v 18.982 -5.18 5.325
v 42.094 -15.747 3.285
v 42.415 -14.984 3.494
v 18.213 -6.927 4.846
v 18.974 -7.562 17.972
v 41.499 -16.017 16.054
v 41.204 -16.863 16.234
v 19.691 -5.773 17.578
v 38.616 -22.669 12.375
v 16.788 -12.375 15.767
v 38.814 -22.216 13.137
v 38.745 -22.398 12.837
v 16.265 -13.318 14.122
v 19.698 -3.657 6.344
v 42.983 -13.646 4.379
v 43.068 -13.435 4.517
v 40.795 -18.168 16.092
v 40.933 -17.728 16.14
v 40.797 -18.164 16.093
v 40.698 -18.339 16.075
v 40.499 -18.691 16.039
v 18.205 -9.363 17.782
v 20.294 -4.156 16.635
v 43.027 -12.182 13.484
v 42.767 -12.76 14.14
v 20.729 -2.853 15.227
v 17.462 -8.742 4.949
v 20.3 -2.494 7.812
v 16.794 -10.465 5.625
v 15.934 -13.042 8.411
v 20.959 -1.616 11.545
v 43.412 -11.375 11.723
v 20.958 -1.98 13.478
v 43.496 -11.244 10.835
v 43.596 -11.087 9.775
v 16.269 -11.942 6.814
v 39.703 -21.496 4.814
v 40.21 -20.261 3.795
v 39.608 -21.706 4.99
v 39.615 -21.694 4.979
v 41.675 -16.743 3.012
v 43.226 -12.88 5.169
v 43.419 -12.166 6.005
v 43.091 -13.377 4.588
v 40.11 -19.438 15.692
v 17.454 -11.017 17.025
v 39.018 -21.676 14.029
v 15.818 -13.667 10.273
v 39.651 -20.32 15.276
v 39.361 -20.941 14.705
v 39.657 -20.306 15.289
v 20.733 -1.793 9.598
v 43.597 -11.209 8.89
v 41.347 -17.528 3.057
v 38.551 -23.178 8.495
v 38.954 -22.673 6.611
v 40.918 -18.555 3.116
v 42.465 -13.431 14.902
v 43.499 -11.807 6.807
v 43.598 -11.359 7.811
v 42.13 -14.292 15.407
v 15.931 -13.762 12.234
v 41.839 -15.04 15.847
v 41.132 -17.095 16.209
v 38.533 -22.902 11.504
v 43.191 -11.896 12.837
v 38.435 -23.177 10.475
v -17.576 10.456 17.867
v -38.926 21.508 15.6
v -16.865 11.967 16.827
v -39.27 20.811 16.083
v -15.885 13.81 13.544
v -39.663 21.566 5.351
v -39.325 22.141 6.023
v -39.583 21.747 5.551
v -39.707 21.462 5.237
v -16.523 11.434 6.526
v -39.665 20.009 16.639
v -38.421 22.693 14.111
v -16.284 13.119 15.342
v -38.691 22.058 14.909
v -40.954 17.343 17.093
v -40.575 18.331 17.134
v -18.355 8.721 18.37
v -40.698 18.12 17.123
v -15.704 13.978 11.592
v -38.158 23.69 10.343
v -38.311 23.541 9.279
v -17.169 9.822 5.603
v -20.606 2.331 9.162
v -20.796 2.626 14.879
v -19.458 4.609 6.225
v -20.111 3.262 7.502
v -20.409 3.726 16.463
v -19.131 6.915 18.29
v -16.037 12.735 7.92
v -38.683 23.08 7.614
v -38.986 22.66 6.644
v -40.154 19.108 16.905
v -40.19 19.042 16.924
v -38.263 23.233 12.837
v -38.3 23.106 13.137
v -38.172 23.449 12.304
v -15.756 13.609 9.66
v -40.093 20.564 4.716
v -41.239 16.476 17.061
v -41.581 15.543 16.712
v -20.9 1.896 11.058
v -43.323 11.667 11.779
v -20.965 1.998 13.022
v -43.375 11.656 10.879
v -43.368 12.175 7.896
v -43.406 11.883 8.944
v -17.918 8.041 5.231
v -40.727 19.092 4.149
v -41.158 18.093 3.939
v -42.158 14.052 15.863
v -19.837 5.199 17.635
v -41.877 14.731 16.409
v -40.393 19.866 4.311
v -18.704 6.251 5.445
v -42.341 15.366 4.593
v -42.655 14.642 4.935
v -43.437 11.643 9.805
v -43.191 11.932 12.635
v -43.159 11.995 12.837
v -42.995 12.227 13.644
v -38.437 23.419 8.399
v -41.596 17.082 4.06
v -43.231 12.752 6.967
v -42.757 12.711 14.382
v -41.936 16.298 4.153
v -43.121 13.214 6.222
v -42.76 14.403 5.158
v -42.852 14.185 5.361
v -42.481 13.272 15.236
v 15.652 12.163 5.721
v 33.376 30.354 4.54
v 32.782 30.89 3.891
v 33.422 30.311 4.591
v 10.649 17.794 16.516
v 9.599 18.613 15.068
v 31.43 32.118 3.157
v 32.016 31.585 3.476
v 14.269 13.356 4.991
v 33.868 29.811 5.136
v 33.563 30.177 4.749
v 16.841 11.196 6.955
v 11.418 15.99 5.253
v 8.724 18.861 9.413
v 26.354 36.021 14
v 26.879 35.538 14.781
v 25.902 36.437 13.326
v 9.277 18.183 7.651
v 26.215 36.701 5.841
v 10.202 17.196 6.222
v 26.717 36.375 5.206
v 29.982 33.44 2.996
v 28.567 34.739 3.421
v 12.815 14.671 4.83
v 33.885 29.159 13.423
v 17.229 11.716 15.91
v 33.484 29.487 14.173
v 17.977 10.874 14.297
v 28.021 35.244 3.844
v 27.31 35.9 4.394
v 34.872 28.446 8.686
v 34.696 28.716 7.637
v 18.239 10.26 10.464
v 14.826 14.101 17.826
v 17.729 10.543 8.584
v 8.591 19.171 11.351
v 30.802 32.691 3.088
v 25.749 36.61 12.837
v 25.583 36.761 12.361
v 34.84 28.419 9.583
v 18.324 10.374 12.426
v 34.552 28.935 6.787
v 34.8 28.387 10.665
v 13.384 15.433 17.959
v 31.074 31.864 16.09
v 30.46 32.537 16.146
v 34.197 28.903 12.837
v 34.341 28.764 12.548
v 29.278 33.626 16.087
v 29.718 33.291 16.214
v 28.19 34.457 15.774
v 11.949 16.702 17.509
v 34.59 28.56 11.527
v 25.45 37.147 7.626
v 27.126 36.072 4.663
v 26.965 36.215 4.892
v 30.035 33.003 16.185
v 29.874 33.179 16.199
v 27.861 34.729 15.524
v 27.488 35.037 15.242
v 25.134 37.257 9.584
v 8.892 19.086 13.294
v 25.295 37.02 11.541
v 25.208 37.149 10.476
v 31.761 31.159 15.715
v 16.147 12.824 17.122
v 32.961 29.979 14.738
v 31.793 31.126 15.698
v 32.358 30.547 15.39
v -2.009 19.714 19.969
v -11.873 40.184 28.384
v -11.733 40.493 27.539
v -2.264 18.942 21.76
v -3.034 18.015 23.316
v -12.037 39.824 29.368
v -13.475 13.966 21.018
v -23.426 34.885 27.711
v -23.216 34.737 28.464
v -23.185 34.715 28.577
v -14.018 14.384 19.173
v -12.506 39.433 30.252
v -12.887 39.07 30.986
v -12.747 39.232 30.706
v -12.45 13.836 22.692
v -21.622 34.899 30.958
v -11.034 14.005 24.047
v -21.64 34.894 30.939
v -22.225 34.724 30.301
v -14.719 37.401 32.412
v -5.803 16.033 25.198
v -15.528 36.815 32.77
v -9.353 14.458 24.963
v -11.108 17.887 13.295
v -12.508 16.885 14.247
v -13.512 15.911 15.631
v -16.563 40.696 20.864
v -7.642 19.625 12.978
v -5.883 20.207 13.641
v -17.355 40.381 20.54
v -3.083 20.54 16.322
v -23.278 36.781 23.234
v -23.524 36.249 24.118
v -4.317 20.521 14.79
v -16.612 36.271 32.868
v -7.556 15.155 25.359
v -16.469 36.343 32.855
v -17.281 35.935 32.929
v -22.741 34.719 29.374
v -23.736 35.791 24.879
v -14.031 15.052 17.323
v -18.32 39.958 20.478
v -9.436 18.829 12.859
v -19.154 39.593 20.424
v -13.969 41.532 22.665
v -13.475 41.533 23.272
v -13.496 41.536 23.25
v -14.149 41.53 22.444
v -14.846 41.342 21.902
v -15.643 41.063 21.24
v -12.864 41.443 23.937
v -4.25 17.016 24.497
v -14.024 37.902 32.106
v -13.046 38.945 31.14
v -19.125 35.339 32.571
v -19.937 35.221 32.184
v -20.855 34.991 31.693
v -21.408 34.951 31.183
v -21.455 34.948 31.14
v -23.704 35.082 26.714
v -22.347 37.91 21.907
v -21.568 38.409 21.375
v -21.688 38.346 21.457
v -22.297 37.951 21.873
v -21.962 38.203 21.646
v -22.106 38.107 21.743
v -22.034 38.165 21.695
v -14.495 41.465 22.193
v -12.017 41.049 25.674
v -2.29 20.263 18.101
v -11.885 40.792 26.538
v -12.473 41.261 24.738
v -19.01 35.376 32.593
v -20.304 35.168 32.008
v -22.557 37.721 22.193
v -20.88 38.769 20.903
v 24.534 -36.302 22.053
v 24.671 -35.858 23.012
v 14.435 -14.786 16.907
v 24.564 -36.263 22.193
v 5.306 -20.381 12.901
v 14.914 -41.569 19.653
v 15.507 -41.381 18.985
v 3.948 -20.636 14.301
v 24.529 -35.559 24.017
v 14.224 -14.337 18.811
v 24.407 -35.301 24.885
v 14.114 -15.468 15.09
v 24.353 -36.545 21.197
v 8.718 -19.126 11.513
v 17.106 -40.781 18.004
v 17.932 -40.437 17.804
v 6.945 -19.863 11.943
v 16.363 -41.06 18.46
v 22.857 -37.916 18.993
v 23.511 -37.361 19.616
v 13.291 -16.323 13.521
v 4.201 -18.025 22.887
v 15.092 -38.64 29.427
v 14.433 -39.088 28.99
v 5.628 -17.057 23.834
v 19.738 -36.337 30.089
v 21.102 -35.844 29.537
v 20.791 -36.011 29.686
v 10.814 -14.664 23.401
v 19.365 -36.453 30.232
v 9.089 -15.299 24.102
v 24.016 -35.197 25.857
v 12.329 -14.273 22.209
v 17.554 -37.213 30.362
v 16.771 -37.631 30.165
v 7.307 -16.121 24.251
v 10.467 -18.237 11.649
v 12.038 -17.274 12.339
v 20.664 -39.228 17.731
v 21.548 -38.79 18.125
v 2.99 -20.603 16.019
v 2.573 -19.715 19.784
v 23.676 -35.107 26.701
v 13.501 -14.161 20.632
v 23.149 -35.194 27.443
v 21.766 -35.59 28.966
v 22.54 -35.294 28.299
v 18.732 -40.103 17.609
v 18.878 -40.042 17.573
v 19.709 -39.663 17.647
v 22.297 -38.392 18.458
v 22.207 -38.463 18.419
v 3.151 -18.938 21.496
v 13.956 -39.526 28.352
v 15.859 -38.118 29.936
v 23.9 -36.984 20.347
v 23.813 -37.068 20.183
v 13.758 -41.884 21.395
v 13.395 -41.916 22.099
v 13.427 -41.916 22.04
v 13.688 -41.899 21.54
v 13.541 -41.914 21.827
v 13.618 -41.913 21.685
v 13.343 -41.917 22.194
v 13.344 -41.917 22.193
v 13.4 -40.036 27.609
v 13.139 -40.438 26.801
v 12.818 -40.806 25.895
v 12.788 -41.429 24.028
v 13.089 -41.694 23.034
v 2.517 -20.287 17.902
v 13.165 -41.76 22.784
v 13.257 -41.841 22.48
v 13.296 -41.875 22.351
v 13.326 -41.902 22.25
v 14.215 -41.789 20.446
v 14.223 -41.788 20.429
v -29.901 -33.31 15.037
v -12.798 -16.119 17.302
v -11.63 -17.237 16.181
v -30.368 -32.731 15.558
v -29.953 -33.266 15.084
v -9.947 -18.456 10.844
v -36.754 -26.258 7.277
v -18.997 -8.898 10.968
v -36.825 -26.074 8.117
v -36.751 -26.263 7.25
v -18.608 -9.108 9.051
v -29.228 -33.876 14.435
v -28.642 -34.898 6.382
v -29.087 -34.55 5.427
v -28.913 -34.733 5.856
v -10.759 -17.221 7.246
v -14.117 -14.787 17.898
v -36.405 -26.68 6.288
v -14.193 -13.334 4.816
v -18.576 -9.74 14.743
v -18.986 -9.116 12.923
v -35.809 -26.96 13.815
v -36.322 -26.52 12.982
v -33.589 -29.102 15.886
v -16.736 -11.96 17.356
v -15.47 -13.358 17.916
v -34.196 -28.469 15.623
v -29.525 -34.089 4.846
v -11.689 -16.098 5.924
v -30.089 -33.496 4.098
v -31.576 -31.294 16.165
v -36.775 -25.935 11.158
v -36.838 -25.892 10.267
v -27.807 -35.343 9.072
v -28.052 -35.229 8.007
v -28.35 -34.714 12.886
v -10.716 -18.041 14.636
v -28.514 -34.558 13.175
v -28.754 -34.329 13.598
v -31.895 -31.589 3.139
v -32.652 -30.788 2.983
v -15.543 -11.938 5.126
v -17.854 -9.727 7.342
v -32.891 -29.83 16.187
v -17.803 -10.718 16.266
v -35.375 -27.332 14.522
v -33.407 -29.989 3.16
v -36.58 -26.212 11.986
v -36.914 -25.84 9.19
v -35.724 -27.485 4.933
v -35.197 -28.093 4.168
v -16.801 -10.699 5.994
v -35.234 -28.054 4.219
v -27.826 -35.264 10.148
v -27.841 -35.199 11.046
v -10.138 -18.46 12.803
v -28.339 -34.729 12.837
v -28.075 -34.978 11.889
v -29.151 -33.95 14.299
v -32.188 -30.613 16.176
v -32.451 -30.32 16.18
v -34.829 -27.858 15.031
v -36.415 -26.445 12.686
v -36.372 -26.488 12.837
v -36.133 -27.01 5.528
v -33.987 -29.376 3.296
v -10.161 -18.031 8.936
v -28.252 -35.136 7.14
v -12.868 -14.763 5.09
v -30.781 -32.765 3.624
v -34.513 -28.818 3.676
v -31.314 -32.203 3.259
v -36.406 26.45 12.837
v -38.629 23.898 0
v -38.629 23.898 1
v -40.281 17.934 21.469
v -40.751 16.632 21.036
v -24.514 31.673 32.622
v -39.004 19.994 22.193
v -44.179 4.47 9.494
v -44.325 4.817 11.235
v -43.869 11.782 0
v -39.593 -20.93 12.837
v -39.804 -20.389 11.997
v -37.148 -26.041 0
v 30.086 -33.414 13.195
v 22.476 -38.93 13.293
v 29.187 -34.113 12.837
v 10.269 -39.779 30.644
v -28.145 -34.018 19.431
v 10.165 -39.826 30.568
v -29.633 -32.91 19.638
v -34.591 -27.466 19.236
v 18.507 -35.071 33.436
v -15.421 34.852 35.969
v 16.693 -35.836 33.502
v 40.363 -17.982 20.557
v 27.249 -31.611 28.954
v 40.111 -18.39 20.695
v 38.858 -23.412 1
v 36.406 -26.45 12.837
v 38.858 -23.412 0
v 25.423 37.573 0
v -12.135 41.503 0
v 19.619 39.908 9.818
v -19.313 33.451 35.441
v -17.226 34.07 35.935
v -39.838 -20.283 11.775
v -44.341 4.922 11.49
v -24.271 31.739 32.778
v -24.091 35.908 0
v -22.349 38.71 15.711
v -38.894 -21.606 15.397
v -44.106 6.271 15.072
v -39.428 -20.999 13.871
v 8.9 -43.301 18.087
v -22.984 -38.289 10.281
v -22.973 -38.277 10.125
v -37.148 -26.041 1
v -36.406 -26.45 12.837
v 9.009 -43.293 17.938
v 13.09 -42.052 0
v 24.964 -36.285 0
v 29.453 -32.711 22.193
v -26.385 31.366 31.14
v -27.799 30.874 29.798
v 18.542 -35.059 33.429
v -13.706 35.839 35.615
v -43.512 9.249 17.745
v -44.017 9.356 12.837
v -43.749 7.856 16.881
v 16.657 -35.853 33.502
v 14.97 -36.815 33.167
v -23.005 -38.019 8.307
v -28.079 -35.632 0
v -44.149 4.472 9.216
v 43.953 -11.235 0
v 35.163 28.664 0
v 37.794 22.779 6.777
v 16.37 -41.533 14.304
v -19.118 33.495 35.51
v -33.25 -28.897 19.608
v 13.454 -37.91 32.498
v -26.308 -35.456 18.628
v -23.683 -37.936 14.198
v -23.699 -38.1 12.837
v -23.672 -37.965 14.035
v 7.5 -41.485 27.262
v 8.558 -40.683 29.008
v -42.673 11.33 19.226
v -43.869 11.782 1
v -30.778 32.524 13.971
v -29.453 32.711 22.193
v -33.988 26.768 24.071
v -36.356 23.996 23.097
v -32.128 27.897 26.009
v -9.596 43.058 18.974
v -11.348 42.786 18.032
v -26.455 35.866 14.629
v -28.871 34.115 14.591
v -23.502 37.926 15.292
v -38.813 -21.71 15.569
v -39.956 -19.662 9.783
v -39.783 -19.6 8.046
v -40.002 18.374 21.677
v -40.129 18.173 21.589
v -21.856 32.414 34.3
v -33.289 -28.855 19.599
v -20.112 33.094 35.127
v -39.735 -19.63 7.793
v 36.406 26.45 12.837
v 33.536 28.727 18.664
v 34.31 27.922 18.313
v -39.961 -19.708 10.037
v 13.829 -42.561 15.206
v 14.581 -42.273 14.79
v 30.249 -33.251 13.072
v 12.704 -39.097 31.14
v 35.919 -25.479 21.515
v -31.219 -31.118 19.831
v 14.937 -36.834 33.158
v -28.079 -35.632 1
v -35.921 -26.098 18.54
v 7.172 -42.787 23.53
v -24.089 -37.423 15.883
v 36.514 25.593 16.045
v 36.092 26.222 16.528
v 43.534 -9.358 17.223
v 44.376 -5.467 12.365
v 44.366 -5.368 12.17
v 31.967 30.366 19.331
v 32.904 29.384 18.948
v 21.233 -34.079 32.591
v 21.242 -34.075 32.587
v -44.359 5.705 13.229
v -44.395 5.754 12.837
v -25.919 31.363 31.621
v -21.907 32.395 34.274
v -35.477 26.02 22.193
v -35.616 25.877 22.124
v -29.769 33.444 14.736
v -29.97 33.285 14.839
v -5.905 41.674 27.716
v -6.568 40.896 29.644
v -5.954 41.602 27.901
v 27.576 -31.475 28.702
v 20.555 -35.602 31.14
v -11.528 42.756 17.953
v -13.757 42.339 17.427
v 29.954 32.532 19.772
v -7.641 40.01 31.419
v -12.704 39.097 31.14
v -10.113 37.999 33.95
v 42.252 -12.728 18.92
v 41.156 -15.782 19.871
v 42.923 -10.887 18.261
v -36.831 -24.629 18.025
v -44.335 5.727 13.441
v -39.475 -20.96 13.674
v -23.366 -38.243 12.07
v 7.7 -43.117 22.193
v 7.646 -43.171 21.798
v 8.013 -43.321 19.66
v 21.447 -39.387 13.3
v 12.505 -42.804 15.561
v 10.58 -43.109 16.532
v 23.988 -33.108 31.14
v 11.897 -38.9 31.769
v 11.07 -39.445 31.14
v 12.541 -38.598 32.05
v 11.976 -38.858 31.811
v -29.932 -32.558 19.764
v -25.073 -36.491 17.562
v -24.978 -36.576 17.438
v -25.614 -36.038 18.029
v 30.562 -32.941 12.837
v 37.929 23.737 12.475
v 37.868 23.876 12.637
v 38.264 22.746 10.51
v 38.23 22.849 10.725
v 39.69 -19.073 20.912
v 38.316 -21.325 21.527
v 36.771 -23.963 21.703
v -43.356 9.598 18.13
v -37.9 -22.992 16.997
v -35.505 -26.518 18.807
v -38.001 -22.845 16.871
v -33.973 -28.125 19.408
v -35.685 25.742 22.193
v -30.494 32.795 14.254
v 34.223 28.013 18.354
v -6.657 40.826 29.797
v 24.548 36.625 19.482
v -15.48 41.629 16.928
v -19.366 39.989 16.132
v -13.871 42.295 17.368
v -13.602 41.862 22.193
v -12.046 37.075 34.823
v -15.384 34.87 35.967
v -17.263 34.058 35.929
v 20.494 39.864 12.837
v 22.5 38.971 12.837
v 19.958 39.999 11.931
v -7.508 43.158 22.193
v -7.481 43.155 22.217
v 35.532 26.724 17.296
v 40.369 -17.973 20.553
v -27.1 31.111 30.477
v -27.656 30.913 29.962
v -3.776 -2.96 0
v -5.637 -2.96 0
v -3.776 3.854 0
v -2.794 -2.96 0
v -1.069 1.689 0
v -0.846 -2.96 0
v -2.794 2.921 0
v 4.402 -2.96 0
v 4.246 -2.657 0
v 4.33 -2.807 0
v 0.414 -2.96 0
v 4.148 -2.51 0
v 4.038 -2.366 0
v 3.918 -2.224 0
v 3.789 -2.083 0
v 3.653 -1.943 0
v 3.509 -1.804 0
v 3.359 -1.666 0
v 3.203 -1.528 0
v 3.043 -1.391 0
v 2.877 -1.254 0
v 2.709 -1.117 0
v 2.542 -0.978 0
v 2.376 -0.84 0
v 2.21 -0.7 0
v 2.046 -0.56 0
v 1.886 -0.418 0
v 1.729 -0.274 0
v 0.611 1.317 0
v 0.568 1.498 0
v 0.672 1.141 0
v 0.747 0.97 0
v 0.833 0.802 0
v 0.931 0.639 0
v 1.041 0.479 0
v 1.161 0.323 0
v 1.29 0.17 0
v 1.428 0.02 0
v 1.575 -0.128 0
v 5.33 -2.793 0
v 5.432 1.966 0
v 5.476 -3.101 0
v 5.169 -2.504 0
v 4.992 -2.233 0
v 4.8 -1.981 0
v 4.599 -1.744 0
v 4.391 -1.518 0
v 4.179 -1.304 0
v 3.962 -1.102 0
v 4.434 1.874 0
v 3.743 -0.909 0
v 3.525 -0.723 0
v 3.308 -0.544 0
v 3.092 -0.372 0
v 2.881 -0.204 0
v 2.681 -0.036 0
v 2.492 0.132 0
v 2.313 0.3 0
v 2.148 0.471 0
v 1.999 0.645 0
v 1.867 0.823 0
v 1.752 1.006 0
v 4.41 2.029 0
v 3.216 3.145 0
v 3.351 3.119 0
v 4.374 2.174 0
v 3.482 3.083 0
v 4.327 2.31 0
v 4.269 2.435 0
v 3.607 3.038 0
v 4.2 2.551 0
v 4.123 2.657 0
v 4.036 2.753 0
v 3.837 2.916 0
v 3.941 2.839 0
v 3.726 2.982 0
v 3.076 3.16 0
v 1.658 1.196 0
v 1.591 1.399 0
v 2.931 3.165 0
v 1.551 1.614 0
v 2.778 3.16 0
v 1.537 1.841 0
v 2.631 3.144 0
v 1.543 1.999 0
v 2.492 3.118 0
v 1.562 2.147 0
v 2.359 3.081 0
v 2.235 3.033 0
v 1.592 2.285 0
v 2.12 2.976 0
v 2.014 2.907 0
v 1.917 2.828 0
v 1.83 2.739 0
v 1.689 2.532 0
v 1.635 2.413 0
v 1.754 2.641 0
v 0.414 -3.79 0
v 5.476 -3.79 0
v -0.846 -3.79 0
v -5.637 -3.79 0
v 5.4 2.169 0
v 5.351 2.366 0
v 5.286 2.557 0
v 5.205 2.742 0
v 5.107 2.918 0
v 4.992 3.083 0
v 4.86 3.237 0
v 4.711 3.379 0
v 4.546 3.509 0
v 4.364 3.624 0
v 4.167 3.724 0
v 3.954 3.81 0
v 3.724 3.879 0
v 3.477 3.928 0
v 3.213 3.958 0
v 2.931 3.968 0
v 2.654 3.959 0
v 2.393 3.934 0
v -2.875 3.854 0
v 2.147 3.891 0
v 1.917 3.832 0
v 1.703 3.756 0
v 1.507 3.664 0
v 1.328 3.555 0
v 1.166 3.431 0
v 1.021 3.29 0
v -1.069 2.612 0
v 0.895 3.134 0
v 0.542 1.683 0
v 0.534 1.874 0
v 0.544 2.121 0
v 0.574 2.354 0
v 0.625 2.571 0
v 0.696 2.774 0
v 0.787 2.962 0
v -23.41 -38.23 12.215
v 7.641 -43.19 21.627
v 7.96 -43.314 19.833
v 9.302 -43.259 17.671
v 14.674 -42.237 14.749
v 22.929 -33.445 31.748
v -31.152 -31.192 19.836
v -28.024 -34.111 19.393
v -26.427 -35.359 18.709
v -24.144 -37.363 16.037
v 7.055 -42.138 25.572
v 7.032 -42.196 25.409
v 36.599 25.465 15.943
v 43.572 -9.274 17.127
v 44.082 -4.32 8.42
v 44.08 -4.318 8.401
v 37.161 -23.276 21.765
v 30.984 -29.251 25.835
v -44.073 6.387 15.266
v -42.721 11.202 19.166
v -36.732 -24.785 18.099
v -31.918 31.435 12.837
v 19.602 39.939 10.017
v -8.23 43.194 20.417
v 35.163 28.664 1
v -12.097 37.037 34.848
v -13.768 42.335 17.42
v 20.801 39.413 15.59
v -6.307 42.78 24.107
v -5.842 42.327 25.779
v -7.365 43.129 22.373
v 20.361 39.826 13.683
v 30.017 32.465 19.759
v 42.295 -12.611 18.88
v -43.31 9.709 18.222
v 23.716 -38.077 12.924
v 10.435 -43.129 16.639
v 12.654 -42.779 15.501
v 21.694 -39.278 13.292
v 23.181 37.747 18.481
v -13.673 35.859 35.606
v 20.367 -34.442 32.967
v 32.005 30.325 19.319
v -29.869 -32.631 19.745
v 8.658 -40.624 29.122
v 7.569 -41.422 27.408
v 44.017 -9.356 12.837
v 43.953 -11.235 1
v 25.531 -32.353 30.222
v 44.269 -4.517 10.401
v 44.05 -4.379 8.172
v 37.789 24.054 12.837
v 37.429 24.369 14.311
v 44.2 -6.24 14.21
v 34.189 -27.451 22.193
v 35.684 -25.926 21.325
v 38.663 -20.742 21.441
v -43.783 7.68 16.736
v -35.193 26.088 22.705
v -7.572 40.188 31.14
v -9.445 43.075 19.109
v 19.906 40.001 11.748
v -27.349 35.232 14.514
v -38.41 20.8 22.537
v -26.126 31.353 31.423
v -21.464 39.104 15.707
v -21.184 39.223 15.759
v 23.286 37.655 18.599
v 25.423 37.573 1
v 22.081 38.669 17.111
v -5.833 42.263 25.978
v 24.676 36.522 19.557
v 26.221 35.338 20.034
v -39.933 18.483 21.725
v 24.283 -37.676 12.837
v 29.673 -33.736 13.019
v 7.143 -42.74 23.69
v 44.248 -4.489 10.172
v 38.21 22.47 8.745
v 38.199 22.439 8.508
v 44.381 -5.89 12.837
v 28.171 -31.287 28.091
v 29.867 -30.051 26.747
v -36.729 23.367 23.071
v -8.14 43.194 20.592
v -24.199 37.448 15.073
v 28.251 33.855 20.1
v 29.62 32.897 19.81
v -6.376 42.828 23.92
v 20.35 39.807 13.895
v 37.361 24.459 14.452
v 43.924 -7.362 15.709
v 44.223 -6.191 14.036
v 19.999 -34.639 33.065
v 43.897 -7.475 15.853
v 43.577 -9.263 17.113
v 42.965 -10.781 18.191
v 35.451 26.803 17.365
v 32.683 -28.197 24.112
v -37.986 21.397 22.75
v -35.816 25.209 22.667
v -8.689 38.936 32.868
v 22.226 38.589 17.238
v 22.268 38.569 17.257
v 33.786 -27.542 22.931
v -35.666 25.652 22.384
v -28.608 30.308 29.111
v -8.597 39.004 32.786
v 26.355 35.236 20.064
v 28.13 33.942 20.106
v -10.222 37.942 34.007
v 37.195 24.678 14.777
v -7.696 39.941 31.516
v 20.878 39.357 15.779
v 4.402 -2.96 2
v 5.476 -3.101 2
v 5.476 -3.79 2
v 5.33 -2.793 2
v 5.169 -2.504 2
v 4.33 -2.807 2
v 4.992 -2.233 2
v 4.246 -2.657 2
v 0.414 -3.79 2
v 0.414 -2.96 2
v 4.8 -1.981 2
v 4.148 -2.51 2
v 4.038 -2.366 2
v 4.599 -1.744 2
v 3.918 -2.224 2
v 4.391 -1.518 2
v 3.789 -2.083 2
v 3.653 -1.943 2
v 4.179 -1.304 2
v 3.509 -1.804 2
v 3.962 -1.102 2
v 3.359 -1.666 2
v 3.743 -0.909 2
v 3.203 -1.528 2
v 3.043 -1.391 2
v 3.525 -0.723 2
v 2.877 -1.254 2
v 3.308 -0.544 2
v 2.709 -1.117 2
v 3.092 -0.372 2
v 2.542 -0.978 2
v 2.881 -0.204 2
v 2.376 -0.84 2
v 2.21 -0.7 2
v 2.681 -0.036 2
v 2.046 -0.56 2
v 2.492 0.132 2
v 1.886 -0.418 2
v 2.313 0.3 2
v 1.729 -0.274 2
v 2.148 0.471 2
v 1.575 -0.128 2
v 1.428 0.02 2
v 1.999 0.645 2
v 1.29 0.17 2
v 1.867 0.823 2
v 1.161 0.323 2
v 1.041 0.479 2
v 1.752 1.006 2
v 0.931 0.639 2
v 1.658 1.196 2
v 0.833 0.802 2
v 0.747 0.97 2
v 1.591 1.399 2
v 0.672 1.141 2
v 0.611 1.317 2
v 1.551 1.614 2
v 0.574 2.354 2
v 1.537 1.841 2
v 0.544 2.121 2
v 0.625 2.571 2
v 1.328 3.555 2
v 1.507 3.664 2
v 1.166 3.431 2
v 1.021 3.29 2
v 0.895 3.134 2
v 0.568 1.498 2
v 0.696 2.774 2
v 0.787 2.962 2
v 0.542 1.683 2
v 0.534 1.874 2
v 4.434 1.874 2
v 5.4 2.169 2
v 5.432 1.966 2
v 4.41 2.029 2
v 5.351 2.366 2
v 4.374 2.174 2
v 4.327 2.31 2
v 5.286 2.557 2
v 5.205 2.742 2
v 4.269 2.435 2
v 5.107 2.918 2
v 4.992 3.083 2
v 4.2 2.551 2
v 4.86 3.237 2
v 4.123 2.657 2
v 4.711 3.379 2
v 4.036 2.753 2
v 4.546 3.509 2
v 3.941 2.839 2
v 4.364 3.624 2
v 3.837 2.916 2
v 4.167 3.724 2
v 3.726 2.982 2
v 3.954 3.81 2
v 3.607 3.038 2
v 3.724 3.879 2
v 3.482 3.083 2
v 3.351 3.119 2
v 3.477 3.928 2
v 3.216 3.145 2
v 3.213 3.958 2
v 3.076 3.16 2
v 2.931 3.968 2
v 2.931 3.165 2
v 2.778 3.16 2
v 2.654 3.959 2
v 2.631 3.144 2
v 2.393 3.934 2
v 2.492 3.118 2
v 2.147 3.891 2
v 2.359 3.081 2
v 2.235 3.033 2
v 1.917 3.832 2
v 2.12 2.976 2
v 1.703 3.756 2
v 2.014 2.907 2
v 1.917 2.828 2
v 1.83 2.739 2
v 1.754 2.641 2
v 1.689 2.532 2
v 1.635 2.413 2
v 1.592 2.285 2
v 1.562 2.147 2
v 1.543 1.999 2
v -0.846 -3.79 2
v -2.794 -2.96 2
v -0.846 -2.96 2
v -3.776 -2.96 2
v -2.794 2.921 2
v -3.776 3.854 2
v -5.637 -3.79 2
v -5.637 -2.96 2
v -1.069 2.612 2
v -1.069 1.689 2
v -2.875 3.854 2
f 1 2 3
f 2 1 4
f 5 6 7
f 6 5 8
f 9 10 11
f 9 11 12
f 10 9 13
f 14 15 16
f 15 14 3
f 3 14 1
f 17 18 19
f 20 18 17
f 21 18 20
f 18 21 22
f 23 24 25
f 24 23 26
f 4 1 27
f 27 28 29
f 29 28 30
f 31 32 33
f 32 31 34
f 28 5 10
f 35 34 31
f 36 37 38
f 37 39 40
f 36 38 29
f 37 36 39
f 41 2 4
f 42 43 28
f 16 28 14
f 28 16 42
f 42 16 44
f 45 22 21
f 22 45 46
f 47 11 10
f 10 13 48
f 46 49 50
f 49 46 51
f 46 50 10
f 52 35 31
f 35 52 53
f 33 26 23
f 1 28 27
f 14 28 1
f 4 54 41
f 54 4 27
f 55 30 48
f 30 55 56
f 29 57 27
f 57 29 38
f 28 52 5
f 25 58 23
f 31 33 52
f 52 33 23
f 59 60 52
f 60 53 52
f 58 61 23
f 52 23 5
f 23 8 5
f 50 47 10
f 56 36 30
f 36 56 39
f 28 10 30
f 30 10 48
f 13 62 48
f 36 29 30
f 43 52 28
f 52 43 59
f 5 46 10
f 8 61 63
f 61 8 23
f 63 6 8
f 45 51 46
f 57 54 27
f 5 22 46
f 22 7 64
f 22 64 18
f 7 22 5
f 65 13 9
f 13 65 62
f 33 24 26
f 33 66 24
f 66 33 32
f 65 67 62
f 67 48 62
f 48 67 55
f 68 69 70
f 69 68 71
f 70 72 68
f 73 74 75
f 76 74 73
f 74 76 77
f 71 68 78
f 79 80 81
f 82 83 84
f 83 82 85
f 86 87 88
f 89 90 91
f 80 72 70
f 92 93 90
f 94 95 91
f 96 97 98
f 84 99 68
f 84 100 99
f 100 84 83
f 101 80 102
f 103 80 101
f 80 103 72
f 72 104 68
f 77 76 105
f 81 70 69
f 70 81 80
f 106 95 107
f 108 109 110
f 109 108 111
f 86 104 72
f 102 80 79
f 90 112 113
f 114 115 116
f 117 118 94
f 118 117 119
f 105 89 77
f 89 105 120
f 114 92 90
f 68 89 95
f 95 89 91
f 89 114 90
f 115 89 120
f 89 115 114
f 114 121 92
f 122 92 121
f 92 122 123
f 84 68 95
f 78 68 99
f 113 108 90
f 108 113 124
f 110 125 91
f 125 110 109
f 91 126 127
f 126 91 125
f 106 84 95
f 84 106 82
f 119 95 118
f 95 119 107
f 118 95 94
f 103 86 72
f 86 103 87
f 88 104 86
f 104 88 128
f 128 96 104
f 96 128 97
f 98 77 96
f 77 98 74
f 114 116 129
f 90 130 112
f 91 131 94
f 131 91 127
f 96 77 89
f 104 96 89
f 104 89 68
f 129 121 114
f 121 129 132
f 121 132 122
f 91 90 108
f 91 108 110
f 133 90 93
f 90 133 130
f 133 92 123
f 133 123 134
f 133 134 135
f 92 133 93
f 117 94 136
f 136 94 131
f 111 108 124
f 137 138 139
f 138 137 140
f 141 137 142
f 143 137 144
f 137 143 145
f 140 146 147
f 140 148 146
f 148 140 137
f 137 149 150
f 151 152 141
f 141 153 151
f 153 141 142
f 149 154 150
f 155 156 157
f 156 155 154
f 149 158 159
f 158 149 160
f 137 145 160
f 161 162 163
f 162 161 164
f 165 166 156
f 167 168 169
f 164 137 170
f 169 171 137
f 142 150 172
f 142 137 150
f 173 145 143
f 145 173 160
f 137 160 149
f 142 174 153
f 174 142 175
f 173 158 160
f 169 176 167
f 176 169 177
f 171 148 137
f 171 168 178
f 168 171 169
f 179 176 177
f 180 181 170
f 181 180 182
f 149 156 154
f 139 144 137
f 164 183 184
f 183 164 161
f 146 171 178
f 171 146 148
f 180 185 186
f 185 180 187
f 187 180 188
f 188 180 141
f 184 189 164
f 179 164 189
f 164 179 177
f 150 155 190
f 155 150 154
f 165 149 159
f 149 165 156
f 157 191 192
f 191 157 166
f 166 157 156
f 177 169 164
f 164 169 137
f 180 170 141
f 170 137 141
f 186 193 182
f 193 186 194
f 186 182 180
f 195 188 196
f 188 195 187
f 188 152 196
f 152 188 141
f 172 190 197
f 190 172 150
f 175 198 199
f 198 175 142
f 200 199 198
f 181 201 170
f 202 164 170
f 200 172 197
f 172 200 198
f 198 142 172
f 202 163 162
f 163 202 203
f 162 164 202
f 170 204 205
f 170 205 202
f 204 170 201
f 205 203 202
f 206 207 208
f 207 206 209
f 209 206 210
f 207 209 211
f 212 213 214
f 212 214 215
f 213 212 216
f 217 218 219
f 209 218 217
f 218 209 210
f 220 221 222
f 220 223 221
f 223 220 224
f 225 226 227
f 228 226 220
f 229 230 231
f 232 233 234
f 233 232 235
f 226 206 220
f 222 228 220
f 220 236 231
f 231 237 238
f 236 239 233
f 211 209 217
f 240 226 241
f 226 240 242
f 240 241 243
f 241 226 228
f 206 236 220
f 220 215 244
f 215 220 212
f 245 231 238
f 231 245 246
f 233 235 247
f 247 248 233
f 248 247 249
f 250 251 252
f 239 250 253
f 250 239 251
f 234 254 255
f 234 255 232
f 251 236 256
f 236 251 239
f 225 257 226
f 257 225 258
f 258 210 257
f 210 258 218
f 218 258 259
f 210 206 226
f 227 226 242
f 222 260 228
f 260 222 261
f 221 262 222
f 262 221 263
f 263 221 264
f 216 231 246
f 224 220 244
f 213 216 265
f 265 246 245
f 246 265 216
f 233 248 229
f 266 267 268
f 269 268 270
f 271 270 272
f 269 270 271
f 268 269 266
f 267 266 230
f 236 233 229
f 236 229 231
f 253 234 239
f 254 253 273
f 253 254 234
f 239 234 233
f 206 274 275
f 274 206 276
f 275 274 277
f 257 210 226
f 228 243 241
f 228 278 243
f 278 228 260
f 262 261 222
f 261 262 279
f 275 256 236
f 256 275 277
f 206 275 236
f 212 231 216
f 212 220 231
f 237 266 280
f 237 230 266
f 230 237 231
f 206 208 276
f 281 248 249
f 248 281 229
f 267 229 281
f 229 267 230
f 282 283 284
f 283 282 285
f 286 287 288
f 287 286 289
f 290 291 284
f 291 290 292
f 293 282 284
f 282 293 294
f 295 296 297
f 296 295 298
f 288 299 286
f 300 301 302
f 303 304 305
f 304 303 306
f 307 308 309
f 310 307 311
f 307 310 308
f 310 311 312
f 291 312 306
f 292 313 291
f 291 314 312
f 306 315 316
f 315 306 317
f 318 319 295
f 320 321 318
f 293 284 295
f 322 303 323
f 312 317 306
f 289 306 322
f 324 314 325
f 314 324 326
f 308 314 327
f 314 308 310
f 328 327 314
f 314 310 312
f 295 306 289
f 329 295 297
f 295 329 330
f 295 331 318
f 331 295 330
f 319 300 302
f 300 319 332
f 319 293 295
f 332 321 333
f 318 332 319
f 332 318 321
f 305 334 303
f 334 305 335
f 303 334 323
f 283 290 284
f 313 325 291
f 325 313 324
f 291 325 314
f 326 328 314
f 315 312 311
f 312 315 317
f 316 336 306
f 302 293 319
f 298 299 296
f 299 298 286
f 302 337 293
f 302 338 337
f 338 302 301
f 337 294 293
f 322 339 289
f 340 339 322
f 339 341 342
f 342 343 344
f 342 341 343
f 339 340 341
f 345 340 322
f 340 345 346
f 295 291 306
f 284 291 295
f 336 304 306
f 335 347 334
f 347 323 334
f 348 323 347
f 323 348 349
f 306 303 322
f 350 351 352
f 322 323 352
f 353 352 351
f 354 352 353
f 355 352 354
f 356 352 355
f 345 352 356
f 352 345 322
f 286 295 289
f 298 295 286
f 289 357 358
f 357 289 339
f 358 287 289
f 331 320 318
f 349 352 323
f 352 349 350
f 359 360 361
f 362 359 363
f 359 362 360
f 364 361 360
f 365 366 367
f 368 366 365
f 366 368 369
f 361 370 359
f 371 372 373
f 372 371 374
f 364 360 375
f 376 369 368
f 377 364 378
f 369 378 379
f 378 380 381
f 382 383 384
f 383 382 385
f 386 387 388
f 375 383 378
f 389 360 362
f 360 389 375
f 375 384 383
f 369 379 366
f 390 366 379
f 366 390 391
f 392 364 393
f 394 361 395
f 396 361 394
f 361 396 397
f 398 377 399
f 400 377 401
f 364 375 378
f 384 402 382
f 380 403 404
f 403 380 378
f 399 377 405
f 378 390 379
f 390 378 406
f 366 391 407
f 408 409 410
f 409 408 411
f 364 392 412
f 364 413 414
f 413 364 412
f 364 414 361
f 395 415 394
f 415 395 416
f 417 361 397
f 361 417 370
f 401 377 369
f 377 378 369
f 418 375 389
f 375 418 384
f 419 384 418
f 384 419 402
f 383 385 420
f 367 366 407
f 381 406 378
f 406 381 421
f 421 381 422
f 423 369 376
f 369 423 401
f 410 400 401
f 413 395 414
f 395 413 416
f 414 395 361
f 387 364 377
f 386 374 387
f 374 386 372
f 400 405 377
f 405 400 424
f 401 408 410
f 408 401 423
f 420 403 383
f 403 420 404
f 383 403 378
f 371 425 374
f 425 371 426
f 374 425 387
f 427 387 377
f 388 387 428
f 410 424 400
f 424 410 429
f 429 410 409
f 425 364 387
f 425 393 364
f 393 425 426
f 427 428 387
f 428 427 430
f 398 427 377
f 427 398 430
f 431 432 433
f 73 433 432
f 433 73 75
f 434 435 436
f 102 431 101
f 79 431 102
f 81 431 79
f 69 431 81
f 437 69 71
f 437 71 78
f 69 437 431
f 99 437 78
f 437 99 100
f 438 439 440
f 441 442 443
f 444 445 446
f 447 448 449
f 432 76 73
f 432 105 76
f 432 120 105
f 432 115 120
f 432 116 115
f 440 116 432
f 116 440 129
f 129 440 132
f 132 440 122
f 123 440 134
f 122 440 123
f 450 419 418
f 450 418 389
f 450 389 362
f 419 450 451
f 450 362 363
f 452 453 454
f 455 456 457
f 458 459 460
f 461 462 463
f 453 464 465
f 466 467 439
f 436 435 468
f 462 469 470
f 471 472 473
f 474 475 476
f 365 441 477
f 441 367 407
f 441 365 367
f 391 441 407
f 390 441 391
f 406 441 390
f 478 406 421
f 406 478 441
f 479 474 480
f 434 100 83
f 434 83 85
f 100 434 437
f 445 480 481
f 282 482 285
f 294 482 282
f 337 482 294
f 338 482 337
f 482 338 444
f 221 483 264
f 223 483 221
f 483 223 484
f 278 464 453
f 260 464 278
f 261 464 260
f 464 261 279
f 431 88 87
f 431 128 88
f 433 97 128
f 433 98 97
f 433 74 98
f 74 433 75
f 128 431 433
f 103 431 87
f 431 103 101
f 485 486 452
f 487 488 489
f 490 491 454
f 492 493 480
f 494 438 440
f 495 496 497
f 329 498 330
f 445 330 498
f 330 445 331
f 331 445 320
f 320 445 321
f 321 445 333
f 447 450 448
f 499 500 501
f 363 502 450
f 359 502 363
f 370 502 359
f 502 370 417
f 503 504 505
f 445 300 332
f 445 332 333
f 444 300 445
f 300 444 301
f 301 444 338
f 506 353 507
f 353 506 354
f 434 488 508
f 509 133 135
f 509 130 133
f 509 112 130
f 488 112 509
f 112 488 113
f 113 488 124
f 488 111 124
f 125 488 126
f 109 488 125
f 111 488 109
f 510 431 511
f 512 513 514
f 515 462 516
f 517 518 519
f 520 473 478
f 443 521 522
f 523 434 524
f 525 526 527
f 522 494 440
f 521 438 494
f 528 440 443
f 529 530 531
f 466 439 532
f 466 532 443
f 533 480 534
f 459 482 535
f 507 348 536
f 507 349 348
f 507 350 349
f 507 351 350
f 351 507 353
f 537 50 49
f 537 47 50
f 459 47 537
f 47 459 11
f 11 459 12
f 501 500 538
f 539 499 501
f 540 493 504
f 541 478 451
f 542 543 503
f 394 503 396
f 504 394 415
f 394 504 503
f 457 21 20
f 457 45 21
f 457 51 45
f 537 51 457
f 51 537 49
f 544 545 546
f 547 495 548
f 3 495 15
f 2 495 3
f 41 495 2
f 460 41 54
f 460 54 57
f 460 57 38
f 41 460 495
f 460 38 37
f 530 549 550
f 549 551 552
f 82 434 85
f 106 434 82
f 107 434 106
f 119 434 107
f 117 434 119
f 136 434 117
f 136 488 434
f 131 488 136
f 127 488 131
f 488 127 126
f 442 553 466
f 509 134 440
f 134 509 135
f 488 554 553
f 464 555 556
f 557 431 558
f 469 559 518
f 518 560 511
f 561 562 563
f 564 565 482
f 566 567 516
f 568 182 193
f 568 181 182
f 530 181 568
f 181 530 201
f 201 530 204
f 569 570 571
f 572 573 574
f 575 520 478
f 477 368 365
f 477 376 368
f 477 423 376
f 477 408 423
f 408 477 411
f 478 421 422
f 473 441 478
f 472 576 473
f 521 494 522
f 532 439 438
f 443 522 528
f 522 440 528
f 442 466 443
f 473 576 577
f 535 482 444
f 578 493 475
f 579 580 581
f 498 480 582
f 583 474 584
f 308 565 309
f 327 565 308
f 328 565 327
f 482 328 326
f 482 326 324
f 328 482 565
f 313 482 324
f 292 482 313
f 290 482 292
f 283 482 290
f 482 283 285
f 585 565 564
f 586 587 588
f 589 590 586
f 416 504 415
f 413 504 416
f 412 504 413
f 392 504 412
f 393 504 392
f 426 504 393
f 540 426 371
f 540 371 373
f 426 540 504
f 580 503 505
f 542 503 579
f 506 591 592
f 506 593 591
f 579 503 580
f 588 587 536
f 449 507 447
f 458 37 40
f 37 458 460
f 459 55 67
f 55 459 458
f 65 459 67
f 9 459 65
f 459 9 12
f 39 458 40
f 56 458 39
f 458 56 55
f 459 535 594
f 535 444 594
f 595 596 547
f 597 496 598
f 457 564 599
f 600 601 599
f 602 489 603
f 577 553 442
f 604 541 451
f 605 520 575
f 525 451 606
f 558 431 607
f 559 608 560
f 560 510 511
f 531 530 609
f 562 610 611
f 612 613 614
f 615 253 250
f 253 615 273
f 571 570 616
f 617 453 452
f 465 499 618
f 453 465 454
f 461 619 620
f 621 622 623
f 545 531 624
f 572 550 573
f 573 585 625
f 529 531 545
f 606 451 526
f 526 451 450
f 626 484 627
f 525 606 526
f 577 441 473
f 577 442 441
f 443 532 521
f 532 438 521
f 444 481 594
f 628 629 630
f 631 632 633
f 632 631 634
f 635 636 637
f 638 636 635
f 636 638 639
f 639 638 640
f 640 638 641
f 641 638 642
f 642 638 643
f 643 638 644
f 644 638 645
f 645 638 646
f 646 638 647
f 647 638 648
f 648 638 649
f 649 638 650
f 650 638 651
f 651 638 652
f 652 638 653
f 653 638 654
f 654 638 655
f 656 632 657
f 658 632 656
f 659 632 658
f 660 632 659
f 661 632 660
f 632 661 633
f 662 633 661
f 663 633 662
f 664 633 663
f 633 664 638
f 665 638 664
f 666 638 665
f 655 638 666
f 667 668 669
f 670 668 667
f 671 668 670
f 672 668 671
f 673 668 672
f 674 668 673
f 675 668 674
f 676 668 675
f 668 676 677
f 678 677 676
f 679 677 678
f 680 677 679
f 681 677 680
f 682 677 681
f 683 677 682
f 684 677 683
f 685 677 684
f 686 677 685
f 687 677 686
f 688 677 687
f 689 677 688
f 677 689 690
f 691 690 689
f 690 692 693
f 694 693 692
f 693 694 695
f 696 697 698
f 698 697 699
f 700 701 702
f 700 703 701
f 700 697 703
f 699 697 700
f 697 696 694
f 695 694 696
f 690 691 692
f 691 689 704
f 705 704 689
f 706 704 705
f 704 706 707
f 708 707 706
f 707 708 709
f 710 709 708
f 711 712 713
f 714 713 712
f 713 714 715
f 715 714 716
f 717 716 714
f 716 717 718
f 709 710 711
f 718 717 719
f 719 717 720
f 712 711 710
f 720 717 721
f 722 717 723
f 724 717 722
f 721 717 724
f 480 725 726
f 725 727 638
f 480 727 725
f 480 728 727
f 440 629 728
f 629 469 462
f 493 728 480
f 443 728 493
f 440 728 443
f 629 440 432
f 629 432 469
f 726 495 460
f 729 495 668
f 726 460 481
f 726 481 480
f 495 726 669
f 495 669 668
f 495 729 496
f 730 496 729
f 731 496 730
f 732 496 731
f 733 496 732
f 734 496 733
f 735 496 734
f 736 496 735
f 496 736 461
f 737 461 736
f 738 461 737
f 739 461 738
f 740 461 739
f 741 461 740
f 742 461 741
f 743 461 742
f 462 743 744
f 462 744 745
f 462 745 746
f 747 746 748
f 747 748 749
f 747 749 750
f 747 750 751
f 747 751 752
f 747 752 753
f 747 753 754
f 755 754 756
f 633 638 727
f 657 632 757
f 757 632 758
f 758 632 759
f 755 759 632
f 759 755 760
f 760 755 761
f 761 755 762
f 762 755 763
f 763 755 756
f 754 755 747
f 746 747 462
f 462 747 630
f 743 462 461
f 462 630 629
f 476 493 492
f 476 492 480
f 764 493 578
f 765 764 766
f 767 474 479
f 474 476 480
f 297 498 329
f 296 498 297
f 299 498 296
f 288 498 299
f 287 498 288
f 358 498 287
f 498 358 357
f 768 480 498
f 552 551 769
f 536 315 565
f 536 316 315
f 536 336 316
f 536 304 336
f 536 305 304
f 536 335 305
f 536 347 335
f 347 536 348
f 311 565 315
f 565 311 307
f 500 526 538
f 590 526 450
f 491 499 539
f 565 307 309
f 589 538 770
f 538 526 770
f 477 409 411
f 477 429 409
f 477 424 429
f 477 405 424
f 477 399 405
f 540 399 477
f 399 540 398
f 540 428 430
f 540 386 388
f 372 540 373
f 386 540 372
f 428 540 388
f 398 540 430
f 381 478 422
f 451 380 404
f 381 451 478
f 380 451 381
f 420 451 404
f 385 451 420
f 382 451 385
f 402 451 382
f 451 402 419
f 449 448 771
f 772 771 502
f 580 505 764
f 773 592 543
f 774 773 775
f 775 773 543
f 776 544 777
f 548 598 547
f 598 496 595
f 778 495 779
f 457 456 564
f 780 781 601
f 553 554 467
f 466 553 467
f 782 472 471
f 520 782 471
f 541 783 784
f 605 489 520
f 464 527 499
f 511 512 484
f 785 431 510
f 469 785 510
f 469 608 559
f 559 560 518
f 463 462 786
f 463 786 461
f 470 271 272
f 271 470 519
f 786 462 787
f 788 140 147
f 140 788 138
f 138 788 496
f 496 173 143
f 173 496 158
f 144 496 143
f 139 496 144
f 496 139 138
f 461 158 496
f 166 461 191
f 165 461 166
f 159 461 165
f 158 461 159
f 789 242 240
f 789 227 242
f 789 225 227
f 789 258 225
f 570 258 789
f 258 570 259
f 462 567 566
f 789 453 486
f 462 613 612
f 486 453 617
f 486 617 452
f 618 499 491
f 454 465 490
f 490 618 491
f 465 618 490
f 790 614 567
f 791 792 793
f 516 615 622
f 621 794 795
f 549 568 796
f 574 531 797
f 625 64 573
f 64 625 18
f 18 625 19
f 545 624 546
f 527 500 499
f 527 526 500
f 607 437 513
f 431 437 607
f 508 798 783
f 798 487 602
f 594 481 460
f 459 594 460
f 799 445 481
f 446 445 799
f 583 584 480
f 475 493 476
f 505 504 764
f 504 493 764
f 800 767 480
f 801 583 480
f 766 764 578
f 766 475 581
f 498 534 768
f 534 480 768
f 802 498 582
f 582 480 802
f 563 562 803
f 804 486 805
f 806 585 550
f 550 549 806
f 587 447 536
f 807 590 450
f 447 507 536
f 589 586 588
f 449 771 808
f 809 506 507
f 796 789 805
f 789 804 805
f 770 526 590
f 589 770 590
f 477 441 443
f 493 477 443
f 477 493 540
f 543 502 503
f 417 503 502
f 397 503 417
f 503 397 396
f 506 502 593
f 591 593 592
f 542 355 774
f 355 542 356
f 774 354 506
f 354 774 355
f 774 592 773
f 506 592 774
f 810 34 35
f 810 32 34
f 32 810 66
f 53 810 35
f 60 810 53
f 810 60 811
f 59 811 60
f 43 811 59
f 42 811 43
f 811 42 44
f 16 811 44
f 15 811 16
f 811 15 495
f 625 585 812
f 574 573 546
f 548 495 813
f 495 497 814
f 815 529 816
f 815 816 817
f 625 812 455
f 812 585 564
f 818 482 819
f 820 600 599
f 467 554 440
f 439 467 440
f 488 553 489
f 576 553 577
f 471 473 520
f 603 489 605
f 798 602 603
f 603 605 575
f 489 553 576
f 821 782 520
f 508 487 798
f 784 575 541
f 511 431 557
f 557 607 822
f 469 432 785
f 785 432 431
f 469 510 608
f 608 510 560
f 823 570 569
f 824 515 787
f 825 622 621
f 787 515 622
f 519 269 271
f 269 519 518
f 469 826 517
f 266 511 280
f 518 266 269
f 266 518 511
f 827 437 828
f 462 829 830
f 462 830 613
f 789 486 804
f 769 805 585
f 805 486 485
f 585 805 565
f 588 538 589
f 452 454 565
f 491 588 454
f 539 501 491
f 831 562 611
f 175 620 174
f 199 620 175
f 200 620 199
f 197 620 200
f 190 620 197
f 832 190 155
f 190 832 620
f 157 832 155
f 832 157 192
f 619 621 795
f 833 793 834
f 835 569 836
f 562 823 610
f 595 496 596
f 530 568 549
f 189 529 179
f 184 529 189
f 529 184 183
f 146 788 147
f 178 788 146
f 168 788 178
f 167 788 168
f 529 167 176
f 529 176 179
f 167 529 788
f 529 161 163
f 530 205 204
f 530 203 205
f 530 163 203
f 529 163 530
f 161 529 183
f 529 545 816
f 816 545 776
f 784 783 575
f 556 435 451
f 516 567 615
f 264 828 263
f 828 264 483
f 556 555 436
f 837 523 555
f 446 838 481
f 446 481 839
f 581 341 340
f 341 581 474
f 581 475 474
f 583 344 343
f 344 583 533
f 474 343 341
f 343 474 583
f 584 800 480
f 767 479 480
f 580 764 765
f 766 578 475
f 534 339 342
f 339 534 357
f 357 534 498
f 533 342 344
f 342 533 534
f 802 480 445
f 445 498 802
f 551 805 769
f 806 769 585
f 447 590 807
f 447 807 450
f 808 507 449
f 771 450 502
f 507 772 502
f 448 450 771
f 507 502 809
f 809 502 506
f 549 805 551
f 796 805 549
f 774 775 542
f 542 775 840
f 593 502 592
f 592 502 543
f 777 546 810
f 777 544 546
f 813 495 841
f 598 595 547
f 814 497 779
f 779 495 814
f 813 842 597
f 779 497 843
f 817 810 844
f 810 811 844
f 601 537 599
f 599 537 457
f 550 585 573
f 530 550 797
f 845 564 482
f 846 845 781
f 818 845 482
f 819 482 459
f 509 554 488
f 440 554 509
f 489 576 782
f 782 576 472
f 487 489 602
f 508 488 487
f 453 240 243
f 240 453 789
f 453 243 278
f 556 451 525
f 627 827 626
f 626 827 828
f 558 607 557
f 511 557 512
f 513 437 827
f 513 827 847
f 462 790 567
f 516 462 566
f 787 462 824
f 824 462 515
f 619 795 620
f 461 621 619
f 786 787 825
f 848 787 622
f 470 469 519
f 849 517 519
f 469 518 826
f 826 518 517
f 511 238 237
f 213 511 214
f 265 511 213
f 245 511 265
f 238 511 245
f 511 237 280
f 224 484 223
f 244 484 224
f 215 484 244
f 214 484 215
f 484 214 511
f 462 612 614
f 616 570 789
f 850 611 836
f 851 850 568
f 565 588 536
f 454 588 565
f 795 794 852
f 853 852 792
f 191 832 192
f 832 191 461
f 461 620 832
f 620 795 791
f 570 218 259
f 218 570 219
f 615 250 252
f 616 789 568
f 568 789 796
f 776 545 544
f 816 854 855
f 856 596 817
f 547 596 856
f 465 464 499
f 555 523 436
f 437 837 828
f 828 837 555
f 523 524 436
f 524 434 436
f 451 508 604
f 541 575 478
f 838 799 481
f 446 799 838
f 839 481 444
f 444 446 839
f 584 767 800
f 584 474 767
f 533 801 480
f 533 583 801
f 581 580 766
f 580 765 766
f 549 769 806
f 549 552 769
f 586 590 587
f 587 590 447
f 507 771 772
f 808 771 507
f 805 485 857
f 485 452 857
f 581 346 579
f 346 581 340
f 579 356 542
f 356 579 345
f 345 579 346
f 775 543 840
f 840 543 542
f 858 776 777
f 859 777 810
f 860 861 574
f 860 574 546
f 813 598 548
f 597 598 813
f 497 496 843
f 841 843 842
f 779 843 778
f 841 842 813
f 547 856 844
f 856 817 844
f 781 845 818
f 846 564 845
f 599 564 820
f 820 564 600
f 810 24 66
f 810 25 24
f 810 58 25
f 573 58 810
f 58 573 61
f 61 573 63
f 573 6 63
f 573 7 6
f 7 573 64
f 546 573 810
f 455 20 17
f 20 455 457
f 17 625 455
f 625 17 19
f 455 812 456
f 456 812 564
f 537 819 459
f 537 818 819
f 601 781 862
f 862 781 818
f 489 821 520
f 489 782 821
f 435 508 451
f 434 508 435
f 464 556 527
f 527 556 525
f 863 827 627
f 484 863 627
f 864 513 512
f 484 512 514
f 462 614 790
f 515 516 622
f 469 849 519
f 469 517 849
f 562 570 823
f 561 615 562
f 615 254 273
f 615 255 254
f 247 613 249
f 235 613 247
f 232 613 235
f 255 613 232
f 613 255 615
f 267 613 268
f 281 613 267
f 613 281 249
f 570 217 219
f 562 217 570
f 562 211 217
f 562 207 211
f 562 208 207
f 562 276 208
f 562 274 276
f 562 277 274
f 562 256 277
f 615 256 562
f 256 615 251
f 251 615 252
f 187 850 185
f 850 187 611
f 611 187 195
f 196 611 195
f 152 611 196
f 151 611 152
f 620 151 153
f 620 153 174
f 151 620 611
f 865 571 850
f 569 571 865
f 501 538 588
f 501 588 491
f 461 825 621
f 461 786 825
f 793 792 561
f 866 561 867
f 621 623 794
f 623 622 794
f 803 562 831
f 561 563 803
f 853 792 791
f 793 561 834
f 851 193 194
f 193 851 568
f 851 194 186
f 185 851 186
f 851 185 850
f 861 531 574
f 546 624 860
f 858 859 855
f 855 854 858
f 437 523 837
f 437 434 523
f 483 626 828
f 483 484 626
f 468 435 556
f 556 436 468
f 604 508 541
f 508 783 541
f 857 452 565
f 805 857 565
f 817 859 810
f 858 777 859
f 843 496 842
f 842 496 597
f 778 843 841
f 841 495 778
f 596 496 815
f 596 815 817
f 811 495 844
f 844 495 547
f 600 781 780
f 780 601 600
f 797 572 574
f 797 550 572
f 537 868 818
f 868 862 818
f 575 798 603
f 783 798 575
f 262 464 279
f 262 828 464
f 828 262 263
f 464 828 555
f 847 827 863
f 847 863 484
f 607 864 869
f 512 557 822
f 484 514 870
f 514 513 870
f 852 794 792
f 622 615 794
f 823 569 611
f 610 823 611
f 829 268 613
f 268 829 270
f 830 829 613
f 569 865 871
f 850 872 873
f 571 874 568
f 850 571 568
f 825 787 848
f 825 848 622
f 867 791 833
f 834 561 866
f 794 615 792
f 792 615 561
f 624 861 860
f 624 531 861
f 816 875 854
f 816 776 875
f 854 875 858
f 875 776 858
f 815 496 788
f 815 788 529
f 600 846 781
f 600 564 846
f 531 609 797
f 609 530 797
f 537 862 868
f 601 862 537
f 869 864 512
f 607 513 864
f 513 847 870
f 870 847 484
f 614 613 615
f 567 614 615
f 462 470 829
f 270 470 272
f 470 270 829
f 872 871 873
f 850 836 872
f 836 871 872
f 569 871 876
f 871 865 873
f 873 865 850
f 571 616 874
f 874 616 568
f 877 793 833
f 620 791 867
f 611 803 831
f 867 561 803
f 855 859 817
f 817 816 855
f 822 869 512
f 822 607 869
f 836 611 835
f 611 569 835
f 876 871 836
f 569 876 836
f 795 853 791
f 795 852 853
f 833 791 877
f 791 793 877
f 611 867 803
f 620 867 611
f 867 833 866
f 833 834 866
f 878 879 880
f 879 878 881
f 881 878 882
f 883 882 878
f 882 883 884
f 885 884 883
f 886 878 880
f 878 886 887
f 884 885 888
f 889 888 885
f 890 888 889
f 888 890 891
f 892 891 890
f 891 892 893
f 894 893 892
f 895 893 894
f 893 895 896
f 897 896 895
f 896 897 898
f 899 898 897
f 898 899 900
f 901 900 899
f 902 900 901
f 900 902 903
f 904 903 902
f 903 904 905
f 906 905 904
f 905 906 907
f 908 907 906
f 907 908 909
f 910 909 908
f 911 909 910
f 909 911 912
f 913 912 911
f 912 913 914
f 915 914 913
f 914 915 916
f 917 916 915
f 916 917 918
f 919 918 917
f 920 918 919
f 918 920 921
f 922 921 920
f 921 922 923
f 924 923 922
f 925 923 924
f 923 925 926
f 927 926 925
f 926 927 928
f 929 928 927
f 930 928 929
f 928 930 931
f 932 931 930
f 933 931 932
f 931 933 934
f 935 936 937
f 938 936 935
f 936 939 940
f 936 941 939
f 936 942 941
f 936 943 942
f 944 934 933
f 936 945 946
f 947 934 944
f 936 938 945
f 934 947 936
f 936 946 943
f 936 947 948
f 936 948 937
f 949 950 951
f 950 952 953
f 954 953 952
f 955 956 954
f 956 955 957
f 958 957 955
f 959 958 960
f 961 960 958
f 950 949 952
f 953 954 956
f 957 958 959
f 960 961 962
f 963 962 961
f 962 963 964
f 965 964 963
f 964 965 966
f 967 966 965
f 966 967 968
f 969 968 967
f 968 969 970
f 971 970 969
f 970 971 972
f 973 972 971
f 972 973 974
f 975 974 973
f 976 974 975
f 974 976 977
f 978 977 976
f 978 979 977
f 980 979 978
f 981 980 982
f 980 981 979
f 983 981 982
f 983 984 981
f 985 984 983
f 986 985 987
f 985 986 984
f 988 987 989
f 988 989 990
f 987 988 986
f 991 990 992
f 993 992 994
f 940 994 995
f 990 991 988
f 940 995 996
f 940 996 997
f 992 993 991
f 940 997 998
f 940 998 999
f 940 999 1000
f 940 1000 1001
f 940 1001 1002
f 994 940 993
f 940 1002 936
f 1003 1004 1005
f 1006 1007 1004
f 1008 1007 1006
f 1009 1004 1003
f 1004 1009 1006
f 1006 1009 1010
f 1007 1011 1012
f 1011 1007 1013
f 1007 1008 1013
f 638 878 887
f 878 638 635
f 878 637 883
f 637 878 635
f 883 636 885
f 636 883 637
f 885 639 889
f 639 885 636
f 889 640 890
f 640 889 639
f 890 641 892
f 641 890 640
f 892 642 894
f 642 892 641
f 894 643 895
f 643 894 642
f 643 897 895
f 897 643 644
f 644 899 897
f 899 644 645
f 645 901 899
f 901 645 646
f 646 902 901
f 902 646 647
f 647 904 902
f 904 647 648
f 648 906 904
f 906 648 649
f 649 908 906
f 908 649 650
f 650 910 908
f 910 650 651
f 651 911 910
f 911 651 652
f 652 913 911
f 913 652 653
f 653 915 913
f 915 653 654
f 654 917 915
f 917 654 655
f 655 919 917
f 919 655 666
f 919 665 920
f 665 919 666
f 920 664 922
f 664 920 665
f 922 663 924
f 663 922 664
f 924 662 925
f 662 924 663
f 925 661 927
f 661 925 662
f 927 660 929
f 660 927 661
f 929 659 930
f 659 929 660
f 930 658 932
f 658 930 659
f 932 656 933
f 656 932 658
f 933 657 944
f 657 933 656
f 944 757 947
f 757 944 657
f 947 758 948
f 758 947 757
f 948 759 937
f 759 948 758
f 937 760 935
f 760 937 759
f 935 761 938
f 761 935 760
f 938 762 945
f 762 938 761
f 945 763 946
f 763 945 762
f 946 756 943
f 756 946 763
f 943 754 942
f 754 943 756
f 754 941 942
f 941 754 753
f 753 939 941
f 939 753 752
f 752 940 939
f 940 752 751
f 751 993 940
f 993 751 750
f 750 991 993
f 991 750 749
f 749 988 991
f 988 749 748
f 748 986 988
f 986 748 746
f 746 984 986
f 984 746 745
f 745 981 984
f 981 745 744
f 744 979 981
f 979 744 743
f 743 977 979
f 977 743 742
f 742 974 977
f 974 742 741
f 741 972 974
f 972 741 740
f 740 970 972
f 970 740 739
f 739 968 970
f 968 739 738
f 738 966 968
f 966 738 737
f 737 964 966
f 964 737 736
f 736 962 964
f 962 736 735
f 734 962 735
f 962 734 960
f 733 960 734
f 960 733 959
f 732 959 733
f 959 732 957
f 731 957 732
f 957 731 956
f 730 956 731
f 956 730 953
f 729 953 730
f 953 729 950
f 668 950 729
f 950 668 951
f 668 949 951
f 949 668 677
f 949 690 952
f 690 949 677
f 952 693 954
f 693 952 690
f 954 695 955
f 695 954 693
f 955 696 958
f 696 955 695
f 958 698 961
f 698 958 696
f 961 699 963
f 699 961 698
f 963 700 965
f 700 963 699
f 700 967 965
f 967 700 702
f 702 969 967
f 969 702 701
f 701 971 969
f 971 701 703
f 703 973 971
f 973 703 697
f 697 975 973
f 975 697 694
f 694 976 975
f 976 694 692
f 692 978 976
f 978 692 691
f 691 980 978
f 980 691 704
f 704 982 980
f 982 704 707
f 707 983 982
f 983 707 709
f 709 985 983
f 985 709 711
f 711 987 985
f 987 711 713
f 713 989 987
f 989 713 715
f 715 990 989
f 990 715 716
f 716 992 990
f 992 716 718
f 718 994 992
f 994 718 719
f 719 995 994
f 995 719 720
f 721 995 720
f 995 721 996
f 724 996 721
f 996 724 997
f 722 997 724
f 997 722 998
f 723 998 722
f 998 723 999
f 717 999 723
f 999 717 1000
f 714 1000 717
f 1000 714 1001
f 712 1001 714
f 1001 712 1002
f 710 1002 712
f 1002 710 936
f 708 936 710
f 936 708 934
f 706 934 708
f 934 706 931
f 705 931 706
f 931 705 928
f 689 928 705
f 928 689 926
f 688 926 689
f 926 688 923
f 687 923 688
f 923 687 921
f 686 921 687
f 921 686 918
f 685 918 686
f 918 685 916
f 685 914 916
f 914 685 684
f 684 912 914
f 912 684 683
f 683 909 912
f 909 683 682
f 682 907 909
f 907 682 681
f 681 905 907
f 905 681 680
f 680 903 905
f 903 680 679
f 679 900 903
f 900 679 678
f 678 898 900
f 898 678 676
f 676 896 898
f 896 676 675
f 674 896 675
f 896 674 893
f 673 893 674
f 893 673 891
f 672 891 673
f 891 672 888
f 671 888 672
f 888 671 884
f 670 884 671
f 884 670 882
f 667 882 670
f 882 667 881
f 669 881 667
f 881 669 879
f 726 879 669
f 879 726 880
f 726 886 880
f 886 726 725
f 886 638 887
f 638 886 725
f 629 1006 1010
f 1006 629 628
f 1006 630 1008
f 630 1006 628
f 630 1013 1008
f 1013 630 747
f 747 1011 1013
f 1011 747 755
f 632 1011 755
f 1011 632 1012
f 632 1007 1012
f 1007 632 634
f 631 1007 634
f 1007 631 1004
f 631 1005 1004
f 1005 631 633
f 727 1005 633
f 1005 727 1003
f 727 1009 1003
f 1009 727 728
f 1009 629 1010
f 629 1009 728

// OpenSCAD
difference() {
	difference() {
		difference() {
			hull() {
				union() {
					union() {
						rotate(a = -22.7032137393, v = [0, 0, 1]) {
							translate(v = [0, -6.6000000000, 0]) {
								cube(size = [44.8834473252, 13.2000000000, 1]);
							}
						}
						rotate(a = 156.6117949407, v = [0, 0, 1]) {
							translate(v = [0, -6.6000000000, 0]) {
								cube(size = [44.9415063774, 13.2000000000, 1]);
							}
						}
						rotate(a = 47.5515196212, v = [0, 0, 1]) {
							translate(v = [0, -6.6000000000, 0]) {
								cube(size = [44.8834476089, 13.2000000000, 1]);
							}
						}
						rotate(a = 115.0783958010, v = [0, 0, 1]) {
							translate(v = [0, -6.6000000000, 0]) {
								cube(size = [42.7336050371, 13.2000000000, 1]);
							}
						}
						rotate(a = -64.0908088880, v = [0, 0, 1]) {
							translate(v = [0, -6.6000000000, 0]) {
								cube(size = [43.5454561665, 13.2000000000, 1]);
							}
						}
						rotate(a = -136.6039430228, v = [0, 0, 1]) {
							translate(v = [0, -6.6000000000, 0]) {
								cube(size = [44.8834466940, 13.2000000000, 1]);
							}
						}
					}
					translate(v = [0, 0, 12.8366978335]) {
						intersection() {
							hull() {
								rotate(a = 94.1246114265, v = [0.3849580616, 0.9201271419, -0.0000013051]) {
									cylinder(h = 45, r = 9.6000000000);
								}
								rotate(a = 92.9217101120, v = [-0.3964430133, -0.9166432552, 0.0000013131]) {
									cylinder(h = 45, r = 9.6000000000);
								}
								rotate(a = 94.1245562003, v = [-0.7359734324, 0.6731789595, 0.0000000628]) {
									cylinder(h = 45, r = 9.6000000000);
								}
								rotate(a = 71.7383656861, v = [-0.8601119511, -0.4025109262, 0.0000012626]) {
									cylinder(h = 45, r = 9.6000000000);
								}
								rotate(a = 75.3926712915, v = [0.8704136325, 0.4228223392, -0.0000012932]) {
									cylinder(h = 45, r = 9.6000000000);
								}
								rotate(a = 94.1247343397, v = [0.6852579577, -0.7247398776, 0.0000000395]) {
									cylinder(h = 45, r = 9.6000000000);
								}
							}
							sphere(r = 45);
						}
					}
				}
			}
			translate(v = [0, 0, 12.8366978335]) {
				rotate(a = 94.1246114265, v = [0.3849580616, 0.9201271419, -0.0000013051]) {
					translate(v = [0, 0, 20]) {
						cylinder(h = 45, r = 6.6000000000);
					}
				}
				rotate(a = 92.9217101120, v = [-0.3964430133, -0.9166432552, 0.0000013131]) {
					translate(v = [0, 0, 20]) {
						cylinder(h = 45, r = 6.6000000000);
					}
				}
				rotate(a = 94.1245562003, v = [-0.7359734324, 0.6731789595, 0.0000000628]) {
					translate(v = [0, 0, 20]) {
						cylinder(h = 45, r = 6.6000000000);
					}
				}
				rotate(a = 71.7383656861, v = [-0.8601119511, -0.4025109262, 0.0000012626]) {
					translate(v = [0, 0, 20]) {
						cylinder(h = 45, r = 6.6000000000);
					}
				}
				rotate(a = 75.3926712915, v = [0.8704136325, 0.4228223392, -0.0000012932]) {
					translate(v = [0, 0, 20]) {
						cylinder(h = 45, r = 6.6000000000);
					}
				}
				rotate(a = 94.1247343397, v = [0.6852579577, -0.7247398776, 0.0000000395]) {
					translate(v = [0, 0, 20]) {
						cylinder(h = 45, r = 6.6000000000);
					}
				}
			}
		}
		translate(v = [-100, -100, -100]) {
			cube(size = [200, 200, 100]);
		}
	}
	translate(v = [0, 0, 2]) {
		rotate(a = 180, v = [0, 1, 0]) {
			linear_extrude(height = 3) {
				text(halign = "center", size = 8, text = "21", valign = "center");
			}
		}
	}
}
